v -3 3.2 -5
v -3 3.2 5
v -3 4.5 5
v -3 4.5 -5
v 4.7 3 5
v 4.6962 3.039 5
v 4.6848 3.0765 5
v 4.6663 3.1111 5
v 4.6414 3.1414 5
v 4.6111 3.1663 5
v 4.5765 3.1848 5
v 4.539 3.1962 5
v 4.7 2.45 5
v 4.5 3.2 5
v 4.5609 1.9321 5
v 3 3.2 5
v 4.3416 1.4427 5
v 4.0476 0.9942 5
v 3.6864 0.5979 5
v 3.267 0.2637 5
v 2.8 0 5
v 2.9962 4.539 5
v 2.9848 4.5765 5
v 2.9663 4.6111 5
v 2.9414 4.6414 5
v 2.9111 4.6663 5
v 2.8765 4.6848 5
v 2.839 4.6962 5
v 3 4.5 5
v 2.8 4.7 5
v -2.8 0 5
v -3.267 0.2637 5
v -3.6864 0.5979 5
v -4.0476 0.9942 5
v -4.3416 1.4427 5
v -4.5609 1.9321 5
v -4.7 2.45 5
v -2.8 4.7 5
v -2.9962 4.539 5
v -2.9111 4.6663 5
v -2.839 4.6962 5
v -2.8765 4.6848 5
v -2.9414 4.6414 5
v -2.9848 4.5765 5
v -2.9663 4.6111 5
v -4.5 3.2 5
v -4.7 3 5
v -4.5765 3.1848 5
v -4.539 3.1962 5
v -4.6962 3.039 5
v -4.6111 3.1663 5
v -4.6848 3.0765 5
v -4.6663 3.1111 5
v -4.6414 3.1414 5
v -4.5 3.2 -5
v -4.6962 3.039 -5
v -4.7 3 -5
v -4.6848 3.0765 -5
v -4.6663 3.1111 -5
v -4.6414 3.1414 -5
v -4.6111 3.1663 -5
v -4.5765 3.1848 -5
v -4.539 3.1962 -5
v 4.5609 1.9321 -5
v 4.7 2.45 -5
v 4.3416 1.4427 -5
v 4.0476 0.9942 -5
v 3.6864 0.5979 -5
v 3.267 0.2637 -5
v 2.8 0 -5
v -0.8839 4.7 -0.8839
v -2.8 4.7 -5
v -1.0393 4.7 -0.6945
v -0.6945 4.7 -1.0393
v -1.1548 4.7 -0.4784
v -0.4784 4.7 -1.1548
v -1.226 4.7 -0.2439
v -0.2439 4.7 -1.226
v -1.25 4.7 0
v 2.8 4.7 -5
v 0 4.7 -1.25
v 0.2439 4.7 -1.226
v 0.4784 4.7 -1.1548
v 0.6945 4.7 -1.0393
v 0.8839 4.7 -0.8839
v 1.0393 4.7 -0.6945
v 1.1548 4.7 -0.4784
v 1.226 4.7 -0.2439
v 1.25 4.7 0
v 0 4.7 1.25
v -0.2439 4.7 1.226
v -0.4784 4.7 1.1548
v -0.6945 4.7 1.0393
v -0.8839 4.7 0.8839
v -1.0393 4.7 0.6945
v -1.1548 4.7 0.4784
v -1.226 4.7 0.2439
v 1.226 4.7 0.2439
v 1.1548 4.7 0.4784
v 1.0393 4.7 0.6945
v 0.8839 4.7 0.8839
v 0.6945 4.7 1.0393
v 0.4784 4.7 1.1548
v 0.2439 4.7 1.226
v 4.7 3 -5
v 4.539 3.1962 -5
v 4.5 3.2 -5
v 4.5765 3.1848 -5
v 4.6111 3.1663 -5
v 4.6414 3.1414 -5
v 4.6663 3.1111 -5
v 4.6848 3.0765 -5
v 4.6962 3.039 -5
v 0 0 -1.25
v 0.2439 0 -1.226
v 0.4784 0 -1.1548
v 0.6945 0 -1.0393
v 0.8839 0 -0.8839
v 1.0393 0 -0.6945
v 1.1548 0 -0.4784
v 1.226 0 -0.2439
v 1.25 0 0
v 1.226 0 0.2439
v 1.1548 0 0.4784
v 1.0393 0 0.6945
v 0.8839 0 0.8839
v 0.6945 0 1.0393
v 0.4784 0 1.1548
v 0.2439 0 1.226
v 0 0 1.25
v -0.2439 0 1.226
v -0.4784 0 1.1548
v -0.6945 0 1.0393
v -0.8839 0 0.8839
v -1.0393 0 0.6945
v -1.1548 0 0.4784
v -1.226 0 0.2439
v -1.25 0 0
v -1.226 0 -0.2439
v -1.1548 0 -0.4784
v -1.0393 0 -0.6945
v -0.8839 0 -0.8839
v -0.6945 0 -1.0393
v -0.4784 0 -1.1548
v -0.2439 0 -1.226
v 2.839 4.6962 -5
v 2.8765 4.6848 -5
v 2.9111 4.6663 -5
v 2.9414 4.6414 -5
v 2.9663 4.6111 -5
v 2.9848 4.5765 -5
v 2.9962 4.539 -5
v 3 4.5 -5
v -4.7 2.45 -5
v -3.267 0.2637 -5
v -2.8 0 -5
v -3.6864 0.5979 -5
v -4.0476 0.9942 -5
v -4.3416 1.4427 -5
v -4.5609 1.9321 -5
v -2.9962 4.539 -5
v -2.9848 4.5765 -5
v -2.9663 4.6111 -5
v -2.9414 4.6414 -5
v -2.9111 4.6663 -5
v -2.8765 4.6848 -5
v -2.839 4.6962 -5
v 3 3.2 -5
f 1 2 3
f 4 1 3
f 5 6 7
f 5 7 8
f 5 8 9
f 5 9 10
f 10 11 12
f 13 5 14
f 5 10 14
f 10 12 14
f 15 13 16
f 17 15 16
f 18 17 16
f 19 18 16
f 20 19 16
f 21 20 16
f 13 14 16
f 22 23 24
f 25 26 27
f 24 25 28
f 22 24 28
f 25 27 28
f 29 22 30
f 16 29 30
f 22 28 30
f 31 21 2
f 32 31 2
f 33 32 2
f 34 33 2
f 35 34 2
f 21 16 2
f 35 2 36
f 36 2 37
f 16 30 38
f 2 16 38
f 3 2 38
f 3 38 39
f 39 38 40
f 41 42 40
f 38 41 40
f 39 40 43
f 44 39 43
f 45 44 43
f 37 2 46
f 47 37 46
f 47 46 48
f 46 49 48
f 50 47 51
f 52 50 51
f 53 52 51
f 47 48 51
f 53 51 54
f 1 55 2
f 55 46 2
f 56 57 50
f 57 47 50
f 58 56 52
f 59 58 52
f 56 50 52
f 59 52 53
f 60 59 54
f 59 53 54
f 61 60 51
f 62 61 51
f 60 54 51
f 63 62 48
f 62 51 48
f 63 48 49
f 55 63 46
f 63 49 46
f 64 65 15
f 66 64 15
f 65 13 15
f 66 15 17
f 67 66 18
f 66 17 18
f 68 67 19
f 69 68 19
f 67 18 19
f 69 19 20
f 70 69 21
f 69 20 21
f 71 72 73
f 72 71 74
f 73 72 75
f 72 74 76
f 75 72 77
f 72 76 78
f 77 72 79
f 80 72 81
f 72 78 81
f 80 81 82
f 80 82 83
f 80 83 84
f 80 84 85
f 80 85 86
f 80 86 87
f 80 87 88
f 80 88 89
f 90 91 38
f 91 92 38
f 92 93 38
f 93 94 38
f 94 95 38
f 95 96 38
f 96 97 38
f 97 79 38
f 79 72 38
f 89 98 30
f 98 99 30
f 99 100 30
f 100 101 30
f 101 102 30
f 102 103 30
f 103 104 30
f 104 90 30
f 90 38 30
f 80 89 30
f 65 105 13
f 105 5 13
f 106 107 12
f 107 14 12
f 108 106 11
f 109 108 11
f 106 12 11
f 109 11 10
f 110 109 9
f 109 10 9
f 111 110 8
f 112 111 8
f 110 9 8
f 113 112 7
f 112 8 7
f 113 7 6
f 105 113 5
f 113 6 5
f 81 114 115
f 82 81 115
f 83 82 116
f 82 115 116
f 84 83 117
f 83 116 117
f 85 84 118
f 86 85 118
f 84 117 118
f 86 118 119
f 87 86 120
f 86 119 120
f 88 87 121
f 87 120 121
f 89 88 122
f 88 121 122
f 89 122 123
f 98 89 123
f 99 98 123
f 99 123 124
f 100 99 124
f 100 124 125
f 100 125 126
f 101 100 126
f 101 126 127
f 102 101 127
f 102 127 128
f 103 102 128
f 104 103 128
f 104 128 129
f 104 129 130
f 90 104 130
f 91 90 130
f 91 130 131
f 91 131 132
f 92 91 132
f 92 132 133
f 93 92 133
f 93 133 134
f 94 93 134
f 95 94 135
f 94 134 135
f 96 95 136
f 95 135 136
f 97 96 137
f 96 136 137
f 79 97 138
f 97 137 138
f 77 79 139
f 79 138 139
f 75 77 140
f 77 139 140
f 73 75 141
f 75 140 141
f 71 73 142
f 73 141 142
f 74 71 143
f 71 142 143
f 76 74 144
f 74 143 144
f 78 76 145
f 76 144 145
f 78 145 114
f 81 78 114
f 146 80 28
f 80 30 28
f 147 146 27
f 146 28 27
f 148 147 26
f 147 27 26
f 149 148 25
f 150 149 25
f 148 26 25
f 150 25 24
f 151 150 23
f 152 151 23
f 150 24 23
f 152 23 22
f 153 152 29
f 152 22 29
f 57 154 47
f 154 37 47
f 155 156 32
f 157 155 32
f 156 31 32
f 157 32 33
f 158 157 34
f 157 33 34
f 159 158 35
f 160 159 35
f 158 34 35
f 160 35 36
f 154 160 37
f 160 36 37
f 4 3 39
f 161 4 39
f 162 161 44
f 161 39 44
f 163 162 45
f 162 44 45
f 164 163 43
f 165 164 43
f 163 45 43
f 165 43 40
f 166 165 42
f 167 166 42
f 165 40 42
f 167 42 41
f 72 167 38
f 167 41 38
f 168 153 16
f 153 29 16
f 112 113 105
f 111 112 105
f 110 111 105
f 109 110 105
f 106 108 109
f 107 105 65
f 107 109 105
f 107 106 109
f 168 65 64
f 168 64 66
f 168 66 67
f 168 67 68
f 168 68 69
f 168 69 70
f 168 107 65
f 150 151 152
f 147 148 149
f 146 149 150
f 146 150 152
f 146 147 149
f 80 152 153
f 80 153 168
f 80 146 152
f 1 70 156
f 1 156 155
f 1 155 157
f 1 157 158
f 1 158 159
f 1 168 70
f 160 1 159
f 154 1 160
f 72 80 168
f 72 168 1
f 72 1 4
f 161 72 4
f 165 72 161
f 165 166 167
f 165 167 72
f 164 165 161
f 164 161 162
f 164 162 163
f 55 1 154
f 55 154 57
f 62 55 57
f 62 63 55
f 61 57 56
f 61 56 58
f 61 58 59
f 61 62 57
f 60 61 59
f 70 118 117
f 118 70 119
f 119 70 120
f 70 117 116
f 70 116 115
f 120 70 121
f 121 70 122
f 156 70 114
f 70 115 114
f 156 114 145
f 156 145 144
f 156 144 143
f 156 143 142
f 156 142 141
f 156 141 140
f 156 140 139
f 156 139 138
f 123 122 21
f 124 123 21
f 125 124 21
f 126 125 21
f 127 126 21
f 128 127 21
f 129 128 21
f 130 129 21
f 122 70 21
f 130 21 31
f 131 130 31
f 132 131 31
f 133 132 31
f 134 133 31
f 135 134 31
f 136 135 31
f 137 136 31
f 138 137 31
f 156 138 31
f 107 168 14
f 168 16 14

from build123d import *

# Parameters (mm, degrees)
EXTRUDE_1_DEPTH      = 5
HOLE_WIZARD_M3_D     = 2.5
HOLE_WIZARD_M3_DEPTH = 7.5
HOLE_WIZARD_M3_TIP   = 0.751075774


with BuildPart() as part:
    # 草图1 → 凸台-拉伸1 (new, symmetric)
    with BuildSketch(Plane.XY):
        with BuildLine():
            Line((-2.8, 4.7), (2.8, 4.7))
            ThreePointArc((2.8, 4.7), (2.941421356, 4.641421356), (3, 4.5))
            Line((3, 4.5), (3, 3.2))
            Line((3, 3.2), (4.5, 3.2))
            ThreePointArc((4.5, 3.2), (4.641421356, 3.141421356), (4.7, 3))
            Line((4.7, 3), (4.7, 2.45))
            ThreePointArc((4.7, 2.45), (4.047583818, 0.994220712), (2.8, 0))
            Line((2.8, 0), (-2.8, 0))
            ThreePointArc((-2.8, 0), (-4.047583818, 0.994220712), (-4.7, 2.45))
            Line((-4.7, 2.45), (-4.7, 3))
            ThreePointArc((-4.7, 3), (-4.641421356, 3.141421356), (-4.5, 3.2))
            Line((-4.5, 3.2), (-3, 3.2))
            Line((-3, 3.2), (-3, 4.5))
            ThreePointArc((-3, 4.5), (-2.941421356, 4.641421356), (-2.8, 4.7))
        make_face()
    extrude(amount=EXTRUDE_1_DEPTH, both=True)

    # M3螺纹孔
    with Locations(Plane.ZX.offset(4.7)):
        with Locations((0, 0)):
            Hole(HOLE_WIZARD_M3_D / 2, depth=HOLE_WIZARD_M3_DEPTH)
            with Locations((0, 0, -(HOLE_WIZARD_M3_DEPTH + HOLE_WIZARD_M3_TIP / 2))):  # 118° drill point
                Cone(0, HOLE_WIZARD_M3_D / 2, HOLE_WIZARD_M3_TIP, mode=Mode.SUBTRACT)


solid = part.part
